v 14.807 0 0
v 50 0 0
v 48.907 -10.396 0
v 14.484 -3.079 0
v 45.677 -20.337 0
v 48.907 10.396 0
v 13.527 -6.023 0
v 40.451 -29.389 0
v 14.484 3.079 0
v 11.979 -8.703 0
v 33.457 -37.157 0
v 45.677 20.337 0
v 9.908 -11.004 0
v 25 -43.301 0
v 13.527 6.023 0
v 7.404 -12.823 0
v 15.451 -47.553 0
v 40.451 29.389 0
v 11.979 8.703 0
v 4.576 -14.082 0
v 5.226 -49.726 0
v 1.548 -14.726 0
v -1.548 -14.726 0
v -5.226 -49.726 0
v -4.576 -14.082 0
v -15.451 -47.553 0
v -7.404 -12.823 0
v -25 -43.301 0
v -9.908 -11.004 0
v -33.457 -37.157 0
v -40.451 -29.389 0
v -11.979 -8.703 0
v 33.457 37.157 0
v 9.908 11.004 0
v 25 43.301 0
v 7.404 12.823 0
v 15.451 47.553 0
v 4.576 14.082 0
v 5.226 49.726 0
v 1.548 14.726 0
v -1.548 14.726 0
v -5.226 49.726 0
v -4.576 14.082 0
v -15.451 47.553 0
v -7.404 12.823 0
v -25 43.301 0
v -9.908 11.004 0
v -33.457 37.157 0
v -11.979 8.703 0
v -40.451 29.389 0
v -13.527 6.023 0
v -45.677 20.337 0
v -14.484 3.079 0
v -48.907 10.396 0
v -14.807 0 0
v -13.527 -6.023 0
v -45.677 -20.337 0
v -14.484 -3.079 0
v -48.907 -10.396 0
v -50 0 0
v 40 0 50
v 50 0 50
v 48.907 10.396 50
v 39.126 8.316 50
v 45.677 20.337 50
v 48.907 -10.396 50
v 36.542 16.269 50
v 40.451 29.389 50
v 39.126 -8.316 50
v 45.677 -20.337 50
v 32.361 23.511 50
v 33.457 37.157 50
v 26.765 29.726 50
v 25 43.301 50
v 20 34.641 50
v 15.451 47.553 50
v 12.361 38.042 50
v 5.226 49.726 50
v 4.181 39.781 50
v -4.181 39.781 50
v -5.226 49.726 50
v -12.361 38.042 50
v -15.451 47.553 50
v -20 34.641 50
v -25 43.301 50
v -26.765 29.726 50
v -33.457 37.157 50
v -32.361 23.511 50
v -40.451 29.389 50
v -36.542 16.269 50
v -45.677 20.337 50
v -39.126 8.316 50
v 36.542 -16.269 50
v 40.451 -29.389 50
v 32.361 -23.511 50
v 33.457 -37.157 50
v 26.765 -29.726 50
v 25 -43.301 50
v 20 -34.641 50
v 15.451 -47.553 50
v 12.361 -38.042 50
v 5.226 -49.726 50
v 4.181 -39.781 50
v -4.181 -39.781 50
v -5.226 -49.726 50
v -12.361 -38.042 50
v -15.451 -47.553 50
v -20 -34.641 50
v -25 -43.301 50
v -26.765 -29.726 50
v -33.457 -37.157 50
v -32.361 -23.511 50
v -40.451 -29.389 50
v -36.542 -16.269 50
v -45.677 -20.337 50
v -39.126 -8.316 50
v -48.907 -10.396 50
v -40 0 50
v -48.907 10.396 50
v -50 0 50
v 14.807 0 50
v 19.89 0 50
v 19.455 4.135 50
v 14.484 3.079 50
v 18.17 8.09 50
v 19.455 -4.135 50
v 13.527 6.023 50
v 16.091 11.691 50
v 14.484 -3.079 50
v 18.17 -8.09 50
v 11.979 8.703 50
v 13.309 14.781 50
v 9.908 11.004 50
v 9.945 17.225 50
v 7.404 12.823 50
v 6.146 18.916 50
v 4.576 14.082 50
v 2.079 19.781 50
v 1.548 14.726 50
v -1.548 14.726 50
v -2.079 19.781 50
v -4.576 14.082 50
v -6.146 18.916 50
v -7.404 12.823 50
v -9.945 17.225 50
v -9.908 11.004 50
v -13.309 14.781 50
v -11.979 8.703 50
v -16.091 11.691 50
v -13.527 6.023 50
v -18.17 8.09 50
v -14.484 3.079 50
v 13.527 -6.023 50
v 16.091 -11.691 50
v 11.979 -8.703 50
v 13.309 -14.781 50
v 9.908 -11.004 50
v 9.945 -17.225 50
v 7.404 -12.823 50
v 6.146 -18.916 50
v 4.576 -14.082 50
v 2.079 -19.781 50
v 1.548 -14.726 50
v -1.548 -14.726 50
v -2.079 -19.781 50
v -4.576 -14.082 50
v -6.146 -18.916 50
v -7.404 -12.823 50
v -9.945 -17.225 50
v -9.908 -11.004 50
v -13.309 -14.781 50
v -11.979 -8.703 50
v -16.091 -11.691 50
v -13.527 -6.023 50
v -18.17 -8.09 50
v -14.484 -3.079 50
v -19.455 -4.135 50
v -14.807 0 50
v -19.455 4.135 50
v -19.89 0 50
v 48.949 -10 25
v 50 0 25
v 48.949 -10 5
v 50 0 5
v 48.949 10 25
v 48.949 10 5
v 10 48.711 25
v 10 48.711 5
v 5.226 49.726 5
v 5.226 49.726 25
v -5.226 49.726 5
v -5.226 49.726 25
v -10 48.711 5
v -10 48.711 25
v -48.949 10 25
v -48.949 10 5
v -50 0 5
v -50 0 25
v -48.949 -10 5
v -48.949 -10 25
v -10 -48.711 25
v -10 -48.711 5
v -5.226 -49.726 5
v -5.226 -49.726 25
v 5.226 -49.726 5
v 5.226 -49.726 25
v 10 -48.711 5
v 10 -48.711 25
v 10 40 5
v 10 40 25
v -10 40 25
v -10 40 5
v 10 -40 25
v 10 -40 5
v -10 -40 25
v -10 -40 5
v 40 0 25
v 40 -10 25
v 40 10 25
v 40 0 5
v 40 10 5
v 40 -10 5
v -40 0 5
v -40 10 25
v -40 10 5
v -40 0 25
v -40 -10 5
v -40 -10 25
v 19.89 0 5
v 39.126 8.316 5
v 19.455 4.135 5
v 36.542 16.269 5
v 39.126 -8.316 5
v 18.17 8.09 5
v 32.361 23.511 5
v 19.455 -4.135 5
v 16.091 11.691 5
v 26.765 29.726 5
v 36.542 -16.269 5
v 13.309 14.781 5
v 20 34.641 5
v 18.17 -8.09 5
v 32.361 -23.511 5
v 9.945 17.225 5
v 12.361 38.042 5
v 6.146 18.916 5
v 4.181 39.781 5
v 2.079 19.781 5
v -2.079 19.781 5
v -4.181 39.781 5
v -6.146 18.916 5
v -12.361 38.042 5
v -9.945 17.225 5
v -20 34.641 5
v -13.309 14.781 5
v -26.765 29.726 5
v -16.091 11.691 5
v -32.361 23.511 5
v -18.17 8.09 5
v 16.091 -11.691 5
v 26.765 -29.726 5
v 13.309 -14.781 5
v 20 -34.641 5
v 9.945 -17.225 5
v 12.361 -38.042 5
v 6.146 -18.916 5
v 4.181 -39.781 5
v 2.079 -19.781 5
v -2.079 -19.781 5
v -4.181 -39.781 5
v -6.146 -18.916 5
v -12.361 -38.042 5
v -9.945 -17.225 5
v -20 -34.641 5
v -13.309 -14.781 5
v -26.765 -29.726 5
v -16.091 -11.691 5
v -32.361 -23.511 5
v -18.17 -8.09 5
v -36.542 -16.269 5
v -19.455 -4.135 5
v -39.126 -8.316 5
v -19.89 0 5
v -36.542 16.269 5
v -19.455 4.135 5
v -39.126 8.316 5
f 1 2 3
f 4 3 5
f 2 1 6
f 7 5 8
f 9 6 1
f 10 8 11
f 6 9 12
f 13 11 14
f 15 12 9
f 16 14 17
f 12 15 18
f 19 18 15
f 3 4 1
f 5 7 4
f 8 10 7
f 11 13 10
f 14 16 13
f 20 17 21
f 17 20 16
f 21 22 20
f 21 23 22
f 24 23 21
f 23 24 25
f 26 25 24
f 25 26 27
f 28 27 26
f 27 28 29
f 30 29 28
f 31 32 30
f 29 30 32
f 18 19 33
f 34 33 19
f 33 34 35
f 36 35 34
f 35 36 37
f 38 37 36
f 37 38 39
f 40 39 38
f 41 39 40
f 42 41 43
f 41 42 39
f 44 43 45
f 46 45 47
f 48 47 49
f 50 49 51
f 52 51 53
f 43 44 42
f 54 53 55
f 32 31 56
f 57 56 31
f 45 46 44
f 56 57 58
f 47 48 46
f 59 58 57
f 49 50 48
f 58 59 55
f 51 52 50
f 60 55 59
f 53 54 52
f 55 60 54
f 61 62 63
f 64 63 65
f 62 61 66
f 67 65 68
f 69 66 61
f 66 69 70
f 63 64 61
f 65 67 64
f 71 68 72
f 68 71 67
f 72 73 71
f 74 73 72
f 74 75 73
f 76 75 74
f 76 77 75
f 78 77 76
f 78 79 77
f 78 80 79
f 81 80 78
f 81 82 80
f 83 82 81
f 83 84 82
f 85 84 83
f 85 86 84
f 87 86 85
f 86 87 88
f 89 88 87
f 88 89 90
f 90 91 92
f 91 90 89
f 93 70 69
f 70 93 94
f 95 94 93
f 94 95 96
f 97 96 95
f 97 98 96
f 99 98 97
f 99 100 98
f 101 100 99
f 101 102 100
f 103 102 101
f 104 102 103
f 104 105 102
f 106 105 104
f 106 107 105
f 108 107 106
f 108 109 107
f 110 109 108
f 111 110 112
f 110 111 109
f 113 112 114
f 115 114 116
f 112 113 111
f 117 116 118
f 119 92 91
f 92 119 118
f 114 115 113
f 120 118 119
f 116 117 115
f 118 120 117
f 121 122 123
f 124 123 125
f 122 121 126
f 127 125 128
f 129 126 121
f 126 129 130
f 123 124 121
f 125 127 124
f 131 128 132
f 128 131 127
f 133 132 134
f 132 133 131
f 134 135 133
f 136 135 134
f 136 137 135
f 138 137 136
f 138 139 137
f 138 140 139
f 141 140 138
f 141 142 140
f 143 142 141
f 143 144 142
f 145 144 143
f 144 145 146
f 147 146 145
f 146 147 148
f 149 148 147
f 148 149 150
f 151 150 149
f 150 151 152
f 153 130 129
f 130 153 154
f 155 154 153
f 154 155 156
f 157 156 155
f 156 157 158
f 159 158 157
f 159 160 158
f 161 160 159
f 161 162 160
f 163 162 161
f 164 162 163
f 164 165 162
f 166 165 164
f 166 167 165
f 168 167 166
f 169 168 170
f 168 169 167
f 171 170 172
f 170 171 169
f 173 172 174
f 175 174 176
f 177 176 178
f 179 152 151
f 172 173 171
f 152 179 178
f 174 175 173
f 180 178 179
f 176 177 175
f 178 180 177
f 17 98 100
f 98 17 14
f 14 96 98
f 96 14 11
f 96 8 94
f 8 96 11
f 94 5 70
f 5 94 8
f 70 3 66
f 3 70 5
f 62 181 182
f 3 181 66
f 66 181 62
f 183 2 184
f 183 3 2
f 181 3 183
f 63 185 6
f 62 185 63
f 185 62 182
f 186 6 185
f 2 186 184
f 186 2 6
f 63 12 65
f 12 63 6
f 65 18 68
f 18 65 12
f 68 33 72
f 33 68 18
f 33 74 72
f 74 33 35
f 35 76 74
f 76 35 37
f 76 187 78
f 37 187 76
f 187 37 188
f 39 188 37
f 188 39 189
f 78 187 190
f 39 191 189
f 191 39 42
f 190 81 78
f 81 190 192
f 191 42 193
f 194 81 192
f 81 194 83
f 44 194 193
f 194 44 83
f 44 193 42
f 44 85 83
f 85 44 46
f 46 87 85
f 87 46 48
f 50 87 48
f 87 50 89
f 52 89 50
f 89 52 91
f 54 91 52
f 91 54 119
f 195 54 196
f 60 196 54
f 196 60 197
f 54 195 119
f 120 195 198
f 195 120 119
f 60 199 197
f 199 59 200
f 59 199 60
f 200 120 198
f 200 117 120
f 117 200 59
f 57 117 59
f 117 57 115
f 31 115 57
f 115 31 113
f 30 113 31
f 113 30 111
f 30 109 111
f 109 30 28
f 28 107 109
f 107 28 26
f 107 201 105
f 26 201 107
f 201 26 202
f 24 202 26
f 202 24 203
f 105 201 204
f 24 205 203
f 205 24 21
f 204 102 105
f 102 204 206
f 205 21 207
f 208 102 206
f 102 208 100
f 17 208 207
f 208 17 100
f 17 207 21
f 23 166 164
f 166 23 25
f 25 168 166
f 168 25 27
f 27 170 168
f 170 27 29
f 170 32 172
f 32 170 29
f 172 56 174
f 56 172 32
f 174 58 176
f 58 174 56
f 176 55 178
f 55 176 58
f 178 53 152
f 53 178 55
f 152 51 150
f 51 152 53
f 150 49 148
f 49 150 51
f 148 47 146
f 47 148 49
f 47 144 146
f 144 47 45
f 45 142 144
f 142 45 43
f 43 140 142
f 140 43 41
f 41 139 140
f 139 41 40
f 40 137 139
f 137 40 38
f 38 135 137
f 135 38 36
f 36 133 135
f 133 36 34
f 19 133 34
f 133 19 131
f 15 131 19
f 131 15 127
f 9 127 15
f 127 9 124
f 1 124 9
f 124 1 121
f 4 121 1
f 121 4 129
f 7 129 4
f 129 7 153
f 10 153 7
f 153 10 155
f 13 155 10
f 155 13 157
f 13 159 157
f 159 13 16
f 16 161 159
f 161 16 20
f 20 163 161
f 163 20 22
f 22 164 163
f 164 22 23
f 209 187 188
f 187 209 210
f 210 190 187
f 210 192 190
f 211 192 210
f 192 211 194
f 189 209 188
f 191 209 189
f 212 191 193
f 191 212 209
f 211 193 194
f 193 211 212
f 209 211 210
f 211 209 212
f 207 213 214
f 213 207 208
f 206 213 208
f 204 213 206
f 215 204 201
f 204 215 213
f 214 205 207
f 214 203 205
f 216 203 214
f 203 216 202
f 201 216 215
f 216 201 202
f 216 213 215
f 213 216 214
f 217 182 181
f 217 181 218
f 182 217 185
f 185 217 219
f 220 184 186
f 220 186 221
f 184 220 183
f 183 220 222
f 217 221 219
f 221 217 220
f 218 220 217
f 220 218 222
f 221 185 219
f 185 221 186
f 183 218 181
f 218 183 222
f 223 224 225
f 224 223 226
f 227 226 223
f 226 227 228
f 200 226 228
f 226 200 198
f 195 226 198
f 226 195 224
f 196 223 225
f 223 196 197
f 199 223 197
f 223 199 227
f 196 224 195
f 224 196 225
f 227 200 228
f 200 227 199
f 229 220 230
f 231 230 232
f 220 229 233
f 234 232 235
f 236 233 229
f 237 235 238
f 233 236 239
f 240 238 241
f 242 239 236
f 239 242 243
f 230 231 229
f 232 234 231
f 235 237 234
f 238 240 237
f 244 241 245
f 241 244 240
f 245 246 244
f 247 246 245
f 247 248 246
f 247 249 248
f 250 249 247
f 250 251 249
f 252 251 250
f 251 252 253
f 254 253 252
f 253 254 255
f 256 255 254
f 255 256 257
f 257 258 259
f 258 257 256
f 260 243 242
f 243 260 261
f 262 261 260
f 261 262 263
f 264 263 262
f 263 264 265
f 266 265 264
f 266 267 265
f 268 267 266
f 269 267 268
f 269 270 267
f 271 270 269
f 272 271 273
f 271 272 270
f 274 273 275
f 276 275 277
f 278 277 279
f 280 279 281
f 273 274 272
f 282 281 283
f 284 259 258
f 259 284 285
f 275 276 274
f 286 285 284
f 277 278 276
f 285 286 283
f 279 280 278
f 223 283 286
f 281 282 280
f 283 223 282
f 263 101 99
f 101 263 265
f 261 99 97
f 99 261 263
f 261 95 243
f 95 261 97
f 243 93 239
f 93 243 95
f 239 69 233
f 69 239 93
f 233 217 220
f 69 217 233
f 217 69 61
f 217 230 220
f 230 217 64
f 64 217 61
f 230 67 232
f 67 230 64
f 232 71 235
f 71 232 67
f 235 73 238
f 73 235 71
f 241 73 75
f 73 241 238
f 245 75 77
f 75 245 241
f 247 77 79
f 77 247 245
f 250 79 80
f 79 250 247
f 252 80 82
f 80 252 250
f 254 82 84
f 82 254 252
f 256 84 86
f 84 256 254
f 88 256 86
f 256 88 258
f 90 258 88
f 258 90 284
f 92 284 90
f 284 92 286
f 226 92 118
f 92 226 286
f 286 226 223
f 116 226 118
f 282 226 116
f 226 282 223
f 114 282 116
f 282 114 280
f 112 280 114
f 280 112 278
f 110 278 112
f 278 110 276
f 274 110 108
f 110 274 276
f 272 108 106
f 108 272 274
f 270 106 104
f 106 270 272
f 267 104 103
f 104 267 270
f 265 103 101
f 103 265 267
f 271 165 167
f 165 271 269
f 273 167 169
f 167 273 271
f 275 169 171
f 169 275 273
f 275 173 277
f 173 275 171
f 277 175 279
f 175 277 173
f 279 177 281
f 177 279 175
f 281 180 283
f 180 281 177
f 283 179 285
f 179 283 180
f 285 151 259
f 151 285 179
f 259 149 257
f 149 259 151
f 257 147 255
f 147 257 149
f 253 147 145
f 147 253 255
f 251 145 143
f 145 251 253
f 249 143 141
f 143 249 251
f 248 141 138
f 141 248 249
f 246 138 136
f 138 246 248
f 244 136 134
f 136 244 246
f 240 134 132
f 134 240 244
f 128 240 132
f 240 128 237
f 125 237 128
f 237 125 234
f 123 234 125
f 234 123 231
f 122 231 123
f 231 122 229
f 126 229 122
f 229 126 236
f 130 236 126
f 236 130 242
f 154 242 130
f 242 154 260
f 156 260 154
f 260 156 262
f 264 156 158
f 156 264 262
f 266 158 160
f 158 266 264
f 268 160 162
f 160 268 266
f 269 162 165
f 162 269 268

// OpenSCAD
/*製作桌面電線理線器*/
/*將桌面上的插頭以及電線集中管理*/
module Hole_Donut(h1,r1,thickness,hole_size=0){
    difference(){
        linear_extrude(50)
            difference(){
                circle(h=h1,r=r1,center = true);
                offset(r = -thickness)
                    circle(h=h1,r=r1,center = true);
            }
        translate([-(hole_size/2),r1-(hole_size/2),(h1-hole_size)/2])
                    cube(size = hole_size);
        translate([-(hole_size/2),-(r1+(hole_size/2)),(h1-hole_size)/2])
            cube(size = hole_size);
        translate([r1-(hole_size/2),-(hole_size/2),(h1-hole_size)/2])
            cube(size = hole_size);
        translate([-(r1+(hole_size/2)),-(hole_size/2),(h1-hole_size)/2])
            cube(size = hole_size);
        translate([-(hole_size/2),r1-(hole_size/2),(h1-hole_size)/2])
            cube(size = hole_size);
        translate([-(hole_size/2),-(r1+(hole_size/2)),(h1-hole_size)/2])
            cube(size = hole_size);
        translate([r1-(hole_size/2),-(hole_size/2),(h1-hole_size)/2])
            cube(size = hole_size);
        translate([-(r1+(hole_size/2)),-(hole_size/2),(h1-hole_size)/2])
            cube(size = hole_size);
        }
}

difference(){
    Hole_Donut(30,50,35,20);
    translate([0,0,5])
        Hole_Donut(30,40,20);
    
}
